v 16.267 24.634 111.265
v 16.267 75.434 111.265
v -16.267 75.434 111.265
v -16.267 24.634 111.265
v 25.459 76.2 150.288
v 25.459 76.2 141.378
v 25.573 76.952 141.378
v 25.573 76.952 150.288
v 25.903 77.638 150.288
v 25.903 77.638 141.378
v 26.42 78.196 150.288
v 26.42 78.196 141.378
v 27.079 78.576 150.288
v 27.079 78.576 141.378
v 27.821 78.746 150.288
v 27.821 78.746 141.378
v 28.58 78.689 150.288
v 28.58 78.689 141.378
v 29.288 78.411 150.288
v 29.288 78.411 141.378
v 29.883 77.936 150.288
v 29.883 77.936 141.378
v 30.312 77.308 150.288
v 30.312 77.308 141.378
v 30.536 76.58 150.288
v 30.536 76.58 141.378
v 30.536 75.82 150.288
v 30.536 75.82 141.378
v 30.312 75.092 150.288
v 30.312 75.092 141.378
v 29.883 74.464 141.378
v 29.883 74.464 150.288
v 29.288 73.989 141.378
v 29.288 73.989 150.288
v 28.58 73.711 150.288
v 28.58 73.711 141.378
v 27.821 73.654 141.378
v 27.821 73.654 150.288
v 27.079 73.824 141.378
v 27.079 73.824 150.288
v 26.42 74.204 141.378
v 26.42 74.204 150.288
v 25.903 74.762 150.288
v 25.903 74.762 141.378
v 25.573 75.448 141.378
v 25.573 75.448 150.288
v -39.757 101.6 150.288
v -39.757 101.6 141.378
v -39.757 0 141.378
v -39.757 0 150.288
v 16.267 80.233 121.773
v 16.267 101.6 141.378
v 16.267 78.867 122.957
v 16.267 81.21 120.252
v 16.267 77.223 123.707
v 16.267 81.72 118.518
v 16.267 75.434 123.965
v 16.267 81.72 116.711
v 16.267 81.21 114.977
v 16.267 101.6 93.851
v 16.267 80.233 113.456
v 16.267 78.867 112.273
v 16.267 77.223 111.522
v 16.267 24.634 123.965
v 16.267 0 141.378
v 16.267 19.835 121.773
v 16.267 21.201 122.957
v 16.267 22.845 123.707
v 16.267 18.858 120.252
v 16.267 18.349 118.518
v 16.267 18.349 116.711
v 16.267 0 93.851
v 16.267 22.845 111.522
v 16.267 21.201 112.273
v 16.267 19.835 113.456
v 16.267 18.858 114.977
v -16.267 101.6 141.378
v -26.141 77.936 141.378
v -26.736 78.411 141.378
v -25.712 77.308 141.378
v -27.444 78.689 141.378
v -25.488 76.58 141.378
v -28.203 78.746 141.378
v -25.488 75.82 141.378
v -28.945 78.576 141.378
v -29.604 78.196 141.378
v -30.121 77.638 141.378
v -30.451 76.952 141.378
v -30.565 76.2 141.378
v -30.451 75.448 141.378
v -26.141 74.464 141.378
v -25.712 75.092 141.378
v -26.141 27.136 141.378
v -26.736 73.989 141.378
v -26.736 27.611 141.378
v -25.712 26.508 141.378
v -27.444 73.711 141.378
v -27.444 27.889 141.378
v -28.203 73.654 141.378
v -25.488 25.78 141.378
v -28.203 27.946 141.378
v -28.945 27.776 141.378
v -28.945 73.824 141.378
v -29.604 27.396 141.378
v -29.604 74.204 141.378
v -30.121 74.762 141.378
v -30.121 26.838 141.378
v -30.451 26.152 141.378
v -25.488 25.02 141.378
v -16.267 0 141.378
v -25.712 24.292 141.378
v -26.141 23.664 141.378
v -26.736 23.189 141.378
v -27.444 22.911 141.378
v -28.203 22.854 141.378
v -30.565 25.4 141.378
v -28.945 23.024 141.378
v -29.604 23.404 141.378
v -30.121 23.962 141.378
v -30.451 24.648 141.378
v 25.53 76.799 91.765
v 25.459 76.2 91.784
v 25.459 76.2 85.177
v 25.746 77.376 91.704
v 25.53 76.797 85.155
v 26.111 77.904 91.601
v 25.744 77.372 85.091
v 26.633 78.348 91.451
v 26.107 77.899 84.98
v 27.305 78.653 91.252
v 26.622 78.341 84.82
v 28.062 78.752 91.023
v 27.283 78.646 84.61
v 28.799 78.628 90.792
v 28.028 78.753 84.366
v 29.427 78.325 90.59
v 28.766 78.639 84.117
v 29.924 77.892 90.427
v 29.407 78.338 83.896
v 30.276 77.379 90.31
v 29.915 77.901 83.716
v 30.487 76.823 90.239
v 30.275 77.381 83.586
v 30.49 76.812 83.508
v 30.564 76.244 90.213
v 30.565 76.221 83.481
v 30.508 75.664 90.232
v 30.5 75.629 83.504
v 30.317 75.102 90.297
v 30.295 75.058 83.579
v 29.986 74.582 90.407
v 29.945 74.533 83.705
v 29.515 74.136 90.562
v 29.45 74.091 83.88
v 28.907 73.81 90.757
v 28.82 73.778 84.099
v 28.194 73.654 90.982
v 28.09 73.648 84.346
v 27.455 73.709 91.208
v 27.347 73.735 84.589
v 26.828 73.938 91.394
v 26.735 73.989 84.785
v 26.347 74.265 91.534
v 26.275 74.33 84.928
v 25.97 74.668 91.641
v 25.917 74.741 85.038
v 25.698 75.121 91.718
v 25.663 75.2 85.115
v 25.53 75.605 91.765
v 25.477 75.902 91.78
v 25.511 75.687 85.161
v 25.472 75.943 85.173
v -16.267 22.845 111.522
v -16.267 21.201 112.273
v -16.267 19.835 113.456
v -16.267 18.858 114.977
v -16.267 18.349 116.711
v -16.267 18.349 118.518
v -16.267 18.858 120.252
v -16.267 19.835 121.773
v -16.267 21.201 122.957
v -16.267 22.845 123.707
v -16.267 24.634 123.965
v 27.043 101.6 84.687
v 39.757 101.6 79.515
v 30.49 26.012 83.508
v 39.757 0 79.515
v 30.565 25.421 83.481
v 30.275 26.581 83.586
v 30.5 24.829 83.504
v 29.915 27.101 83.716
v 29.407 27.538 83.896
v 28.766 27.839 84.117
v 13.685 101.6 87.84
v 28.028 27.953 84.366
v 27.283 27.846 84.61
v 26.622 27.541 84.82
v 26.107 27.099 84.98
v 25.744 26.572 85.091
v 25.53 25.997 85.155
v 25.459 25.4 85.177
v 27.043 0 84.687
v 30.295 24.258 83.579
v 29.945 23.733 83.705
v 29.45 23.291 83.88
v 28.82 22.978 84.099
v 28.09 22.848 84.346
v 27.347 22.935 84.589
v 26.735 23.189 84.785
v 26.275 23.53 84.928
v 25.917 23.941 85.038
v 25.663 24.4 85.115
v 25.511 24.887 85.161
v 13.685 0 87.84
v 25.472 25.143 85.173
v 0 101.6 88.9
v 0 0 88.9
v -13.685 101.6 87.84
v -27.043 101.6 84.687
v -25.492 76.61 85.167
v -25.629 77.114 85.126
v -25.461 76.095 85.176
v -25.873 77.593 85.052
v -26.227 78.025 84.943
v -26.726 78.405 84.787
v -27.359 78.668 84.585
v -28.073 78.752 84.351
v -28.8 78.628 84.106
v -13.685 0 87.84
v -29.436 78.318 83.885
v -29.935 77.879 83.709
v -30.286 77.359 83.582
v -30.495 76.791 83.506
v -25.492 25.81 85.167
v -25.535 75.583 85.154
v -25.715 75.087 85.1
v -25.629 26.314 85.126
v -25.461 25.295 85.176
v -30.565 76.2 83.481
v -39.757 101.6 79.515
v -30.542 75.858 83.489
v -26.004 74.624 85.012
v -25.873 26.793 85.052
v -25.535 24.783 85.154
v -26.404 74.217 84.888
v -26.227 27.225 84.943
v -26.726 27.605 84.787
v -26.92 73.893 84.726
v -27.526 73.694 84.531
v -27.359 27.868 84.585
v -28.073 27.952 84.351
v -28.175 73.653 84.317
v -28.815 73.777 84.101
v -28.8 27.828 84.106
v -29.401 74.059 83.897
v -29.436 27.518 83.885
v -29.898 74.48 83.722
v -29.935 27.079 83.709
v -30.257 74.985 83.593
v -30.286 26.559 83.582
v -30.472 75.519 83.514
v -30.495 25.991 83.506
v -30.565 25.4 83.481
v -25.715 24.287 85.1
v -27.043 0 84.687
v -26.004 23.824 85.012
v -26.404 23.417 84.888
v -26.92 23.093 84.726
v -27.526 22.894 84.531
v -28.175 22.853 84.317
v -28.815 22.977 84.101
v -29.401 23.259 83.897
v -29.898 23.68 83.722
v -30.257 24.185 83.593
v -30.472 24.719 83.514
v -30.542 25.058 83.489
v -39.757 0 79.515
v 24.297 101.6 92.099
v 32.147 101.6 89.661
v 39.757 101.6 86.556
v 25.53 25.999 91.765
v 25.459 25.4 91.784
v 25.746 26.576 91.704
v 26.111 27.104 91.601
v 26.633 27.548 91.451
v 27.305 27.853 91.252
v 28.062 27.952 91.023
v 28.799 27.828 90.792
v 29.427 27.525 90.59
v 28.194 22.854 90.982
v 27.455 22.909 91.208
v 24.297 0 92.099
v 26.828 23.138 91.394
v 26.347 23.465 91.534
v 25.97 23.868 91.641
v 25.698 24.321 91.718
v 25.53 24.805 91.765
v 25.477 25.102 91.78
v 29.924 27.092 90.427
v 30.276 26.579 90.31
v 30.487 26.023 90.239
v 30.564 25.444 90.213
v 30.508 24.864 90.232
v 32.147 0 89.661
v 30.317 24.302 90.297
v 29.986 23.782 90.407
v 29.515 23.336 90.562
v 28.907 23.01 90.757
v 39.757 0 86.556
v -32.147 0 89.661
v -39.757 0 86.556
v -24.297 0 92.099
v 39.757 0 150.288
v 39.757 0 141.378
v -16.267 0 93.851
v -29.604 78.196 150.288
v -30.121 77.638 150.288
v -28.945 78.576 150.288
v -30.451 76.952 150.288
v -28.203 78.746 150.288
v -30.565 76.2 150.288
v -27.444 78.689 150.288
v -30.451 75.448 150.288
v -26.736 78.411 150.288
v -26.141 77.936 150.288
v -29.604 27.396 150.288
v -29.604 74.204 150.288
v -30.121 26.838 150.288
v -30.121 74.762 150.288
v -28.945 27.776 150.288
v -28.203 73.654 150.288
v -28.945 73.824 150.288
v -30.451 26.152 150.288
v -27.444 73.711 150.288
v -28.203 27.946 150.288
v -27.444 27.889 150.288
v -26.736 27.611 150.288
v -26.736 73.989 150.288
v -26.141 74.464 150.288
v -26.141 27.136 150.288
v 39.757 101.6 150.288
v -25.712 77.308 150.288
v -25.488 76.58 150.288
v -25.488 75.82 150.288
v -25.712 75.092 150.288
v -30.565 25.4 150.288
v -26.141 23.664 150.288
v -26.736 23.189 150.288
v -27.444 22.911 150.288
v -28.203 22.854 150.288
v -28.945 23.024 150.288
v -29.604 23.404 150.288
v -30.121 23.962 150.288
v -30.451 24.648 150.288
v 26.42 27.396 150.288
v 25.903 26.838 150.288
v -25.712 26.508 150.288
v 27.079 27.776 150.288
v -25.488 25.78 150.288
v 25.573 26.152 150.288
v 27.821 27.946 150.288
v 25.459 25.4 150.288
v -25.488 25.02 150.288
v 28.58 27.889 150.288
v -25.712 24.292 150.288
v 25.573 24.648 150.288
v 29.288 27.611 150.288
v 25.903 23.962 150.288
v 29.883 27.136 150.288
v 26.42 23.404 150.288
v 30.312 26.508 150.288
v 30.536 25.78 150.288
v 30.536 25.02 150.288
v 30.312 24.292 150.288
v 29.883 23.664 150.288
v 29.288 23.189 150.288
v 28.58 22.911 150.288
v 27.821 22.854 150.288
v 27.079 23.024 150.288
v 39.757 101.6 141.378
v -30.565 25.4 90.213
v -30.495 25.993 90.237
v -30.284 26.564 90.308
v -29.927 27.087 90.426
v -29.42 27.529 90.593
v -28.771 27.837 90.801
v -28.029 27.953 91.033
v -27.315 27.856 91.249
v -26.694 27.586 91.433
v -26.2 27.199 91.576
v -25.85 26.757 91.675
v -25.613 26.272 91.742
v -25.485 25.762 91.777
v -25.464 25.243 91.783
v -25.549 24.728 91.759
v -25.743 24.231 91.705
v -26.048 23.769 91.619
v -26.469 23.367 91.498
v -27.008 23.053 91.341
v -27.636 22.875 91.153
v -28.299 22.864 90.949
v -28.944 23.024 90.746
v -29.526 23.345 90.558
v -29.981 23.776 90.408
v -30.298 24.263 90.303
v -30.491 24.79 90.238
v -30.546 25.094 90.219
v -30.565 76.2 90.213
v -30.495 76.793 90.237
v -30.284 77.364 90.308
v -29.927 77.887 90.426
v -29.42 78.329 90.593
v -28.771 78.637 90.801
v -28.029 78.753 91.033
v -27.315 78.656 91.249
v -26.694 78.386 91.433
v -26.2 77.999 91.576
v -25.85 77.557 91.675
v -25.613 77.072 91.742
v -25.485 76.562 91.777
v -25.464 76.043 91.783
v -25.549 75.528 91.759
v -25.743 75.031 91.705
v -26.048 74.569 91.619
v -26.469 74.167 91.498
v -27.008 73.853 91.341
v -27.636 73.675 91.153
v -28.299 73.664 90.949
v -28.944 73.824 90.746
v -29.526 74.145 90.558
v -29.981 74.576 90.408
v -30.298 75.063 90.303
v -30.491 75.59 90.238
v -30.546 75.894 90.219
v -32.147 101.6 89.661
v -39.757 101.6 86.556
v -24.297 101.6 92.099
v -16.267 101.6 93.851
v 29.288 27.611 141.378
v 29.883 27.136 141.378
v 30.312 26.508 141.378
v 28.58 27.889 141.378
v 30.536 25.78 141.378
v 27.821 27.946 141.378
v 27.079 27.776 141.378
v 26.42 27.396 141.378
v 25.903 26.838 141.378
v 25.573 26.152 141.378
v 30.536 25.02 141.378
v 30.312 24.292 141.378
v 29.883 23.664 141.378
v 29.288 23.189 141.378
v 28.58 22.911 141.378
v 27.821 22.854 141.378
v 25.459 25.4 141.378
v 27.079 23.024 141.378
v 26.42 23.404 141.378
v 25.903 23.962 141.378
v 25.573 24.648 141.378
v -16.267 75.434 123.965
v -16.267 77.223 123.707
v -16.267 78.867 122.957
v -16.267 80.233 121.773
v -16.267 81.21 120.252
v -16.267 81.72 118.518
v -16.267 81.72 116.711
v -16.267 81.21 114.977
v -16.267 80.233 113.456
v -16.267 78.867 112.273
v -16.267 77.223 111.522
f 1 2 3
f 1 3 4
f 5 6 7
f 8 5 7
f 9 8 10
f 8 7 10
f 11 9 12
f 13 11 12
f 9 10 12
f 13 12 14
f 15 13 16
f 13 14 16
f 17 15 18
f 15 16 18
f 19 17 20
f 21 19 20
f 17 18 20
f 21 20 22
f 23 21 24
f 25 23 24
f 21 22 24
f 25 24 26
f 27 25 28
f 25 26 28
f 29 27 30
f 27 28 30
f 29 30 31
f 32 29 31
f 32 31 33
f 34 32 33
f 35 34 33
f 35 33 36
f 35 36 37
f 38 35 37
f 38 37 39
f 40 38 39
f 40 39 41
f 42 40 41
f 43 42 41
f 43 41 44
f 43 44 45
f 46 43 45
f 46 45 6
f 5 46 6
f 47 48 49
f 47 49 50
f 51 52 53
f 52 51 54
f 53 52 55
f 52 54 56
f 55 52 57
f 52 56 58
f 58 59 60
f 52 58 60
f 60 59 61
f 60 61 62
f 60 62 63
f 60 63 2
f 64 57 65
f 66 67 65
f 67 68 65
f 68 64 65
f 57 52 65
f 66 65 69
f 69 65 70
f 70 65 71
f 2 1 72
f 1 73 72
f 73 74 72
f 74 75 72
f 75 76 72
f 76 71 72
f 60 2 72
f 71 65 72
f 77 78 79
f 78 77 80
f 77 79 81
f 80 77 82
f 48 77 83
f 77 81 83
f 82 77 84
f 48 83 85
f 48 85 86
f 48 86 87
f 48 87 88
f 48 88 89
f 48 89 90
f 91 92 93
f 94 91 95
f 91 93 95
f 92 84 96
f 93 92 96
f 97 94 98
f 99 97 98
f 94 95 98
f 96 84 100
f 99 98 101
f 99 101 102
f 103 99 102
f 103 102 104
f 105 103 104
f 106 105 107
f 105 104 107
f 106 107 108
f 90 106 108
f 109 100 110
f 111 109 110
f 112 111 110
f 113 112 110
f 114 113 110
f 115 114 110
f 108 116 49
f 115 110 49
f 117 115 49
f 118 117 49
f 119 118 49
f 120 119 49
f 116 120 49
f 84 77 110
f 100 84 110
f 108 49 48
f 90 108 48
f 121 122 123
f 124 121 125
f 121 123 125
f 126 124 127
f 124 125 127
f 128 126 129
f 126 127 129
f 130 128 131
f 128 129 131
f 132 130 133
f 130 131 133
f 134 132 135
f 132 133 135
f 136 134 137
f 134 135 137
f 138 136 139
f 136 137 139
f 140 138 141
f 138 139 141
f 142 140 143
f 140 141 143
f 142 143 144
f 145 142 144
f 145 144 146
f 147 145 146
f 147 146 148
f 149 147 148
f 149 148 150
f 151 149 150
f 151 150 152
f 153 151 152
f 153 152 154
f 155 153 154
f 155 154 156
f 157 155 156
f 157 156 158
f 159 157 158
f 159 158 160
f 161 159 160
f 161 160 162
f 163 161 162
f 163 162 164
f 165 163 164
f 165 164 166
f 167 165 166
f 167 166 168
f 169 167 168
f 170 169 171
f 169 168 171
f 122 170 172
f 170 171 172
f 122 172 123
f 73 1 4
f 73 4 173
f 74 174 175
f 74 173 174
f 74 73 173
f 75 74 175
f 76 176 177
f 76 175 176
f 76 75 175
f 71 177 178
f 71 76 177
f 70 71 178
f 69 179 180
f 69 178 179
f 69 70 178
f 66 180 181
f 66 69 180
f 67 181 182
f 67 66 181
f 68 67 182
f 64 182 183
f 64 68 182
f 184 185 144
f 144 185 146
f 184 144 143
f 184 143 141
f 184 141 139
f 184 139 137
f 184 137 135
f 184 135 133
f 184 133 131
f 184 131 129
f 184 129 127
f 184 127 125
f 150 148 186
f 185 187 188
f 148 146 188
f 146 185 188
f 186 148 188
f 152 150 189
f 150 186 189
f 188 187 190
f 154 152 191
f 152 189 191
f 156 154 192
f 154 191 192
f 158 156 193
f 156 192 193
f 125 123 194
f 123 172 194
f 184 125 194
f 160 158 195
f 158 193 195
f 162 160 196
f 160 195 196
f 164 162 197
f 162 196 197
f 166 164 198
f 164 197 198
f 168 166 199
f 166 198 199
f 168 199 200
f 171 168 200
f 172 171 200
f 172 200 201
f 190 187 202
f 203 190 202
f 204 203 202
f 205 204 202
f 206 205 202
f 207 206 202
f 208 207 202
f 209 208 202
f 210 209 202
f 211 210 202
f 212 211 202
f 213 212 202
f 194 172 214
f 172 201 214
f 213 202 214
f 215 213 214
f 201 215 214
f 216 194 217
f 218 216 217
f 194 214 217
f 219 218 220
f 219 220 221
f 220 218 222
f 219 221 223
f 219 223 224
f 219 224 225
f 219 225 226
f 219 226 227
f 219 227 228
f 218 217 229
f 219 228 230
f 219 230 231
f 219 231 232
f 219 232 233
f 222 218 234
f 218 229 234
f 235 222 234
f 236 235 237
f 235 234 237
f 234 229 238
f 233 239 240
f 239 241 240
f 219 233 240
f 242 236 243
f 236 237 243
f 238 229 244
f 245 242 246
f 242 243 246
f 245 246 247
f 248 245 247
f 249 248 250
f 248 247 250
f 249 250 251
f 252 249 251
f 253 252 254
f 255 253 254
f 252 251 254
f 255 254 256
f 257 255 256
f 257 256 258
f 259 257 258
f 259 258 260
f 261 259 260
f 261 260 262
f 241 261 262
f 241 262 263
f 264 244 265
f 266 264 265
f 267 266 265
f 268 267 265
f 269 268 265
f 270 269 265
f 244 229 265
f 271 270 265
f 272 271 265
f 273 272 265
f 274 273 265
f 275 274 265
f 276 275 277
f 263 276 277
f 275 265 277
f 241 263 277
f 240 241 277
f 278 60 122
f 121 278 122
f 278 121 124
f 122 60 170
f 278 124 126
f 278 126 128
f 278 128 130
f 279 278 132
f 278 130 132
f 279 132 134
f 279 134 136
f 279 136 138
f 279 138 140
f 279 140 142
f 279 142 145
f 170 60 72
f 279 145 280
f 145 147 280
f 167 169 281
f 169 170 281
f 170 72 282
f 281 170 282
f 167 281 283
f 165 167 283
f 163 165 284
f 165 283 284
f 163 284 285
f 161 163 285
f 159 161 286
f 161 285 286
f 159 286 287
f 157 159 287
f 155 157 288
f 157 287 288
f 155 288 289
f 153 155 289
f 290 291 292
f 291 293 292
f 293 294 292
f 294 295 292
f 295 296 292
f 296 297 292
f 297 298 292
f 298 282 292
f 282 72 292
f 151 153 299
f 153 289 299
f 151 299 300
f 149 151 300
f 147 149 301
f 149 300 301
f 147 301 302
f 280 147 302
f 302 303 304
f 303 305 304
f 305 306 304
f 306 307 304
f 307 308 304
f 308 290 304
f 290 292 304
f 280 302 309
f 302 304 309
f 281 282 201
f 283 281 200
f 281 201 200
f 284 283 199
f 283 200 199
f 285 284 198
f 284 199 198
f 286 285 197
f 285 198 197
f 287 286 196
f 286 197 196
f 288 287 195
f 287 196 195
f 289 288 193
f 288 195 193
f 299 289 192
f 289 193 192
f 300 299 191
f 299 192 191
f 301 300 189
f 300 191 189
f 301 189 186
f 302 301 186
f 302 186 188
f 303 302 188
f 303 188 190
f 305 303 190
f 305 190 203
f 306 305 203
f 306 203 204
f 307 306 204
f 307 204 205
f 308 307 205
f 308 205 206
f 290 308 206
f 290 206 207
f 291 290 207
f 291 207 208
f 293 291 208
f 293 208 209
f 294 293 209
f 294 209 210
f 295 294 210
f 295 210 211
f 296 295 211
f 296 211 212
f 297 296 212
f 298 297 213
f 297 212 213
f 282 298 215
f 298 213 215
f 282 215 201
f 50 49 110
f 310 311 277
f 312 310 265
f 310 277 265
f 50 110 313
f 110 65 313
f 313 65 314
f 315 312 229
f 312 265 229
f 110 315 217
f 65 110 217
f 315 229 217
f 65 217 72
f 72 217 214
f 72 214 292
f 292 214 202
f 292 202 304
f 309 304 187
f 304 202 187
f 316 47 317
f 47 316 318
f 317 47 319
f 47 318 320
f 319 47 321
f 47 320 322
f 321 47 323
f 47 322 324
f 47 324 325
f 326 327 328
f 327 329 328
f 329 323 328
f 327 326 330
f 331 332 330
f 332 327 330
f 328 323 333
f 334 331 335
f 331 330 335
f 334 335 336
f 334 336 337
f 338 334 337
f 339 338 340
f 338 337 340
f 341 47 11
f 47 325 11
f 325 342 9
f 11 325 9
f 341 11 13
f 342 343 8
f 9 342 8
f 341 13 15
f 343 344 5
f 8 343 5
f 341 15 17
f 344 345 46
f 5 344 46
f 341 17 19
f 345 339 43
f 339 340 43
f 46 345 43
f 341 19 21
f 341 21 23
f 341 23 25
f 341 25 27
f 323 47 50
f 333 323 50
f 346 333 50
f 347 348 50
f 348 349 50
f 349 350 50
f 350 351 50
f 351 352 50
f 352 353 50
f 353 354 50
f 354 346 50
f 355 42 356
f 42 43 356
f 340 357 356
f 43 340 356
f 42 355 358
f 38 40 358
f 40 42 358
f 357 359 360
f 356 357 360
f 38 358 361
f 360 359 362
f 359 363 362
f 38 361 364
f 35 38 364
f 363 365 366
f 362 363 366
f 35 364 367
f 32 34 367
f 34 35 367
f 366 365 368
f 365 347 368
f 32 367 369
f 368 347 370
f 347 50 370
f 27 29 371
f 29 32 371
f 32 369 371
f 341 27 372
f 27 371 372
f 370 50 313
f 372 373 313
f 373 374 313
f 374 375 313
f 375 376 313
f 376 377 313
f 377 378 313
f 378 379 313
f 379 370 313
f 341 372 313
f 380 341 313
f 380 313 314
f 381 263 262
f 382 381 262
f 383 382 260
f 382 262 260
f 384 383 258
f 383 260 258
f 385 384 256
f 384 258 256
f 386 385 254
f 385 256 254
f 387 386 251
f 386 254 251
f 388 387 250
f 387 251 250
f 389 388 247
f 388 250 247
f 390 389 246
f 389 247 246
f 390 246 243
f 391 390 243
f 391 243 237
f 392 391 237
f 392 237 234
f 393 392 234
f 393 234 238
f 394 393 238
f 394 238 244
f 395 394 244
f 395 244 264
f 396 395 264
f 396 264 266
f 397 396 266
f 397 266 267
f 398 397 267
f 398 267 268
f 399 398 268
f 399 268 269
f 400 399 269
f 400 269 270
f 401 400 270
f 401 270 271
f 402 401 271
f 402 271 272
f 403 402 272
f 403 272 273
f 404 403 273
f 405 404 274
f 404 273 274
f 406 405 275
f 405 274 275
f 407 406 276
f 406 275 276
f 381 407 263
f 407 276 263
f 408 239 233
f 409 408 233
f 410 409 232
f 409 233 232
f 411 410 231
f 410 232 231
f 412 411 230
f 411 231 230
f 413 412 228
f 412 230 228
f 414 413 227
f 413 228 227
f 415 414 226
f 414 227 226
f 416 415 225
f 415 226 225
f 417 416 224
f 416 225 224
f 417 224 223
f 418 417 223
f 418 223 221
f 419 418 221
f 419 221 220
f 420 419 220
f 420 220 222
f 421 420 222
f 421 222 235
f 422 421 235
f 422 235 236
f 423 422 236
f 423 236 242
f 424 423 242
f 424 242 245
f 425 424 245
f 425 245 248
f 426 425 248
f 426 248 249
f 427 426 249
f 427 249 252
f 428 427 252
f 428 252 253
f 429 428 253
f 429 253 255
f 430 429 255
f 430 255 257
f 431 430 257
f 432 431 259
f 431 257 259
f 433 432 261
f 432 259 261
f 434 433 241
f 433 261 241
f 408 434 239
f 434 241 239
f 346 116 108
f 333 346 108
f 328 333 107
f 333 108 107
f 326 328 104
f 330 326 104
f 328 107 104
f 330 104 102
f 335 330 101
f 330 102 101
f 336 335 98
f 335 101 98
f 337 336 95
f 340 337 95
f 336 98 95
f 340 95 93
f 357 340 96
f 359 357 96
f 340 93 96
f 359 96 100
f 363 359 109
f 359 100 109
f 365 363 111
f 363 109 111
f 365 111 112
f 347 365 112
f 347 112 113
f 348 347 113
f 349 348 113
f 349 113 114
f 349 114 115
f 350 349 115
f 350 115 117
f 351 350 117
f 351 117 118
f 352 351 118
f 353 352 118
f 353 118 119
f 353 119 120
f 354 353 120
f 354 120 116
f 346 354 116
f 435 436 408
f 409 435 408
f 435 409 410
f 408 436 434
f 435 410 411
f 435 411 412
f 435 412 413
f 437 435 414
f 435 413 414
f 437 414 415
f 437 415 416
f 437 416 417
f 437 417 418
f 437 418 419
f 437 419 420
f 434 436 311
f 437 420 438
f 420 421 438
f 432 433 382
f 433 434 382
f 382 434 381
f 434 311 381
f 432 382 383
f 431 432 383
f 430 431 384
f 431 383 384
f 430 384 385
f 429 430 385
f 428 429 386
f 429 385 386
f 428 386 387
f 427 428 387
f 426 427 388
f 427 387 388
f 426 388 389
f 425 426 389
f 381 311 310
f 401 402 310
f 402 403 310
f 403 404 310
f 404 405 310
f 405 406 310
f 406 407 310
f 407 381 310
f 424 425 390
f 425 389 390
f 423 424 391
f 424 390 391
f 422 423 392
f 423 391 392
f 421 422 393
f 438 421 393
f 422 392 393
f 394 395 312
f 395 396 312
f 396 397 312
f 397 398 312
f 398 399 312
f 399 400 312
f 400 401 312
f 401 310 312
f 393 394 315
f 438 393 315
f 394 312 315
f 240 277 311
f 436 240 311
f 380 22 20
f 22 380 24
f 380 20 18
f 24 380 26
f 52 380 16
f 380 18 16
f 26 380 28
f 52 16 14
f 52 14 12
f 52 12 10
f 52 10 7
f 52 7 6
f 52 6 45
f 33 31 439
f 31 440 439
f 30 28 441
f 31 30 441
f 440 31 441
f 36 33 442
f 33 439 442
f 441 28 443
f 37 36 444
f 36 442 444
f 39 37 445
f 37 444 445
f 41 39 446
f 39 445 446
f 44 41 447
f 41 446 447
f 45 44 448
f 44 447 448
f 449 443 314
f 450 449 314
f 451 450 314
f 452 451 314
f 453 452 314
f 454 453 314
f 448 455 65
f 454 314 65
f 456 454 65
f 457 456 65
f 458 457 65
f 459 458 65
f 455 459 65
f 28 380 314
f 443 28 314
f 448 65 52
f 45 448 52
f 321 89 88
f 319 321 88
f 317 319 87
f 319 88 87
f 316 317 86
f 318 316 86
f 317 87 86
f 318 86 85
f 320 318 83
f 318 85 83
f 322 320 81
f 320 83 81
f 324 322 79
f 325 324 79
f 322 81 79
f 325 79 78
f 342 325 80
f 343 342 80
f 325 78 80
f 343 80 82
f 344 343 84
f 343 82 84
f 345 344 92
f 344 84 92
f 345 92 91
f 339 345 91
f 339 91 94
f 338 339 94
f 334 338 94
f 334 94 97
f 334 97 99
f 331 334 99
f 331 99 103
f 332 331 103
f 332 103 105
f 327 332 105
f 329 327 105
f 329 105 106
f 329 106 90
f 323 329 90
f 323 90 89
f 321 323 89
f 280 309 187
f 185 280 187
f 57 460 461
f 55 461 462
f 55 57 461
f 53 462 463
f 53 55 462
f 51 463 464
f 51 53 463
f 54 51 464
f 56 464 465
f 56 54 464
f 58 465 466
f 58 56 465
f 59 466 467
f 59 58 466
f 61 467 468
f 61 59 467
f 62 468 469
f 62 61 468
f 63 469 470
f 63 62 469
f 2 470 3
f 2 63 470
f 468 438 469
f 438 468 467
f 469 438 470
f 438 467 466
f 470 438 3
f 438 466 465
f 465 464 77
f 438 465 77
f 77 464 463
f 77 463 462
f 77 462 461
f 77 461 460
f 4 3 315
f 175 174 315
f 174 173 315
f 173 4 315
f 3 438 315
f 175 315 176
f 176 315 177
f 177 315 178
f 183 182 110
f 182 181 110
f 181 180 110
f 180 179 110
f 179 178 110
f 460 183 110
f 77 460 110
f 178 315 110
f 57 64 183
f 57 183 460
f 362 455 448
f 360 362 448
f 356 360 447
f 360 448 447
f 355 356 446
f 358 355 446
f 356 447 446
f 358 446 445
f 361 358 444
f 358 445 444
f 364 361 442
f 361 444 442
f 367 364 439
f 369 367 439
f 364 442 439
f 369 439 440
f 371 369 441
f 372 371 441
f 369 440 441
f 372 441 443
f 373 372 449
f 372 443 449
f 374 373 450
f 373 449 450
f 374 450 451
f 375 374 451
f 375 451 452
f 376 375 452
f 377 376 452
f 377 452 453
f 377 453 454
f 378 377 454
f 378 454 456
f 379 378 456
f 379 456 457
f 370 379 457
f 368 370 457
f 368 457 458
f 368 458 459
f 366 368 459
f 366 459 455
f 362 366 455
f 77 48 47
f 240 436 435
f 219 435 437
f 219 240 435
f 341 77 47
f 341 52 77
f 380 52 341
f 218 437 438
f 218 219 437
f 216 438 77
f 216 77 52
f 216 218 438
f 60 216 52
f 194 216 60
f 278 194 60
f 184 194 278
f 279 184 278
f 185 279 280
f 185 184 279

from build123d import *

# Parameters (mm, degrees)
BOSS_EXTRUDE1_DEPTH         = 101.6
CUT_EXTRUDE1_DEPTH          = 57.023894283
TAP_DRILL_FOR_1_4_20_TAP2_D = 5.1054


with BuildPart() as part:
    # Sketch1 → Boss-Extrude1 (new body)
    with BuildSketch(Plane(origin=(0, 0, 0), x_dir=(1, 0, 0), z_dir=(0, 1, 0))):
        with BuildLine():
            Line((-16.266605643, -141.378421793), (-39.75728864, -141.378421793))
            Line((-39.75728864, -141.378421793), (-39.75728864, -150.287727069))
            Line((-39.75728864, -150.287727069), (39.75728864, -150.287727069))
            Line((39.75728864, -150.287727069), (39.75728864, -141.378421793))
            Line((39.75728864, -141.378421793), (16.266605643, -141.378421793))
            Line((16.266605643, -141.378421793), (16.266605643, -93.850732767))
            ThreePointArc((16.266605643, -93.850732767), (28.248414097, -90.964771208), (39.75728864, -86.555880794))
            Line((39.75728864, -86.555880794), (39.75728864, -79.51457728))
            ThreePointArc((39.75728864, -79.51457728), (0, -88.9), (-39.75728864, -79.51457728))
            Line((-39.75728864, -79.51457728), (-39.75728864, -86.555880794))
            ThreePointArc((-39.75728864, -86.555880794), (-28.248414097, -90.964771208), (-16.266605643, -93.850732767))
            Line((-16.266605643, -93.850732767), (-16.266605643, -141.378421793))
        make_face()
    extrude(amount=BOSS_EXTRUDE1_DEPTH)

    # Sketch2 → Cut-Extrude1 (cut, through all)
    with BuildSketch(Plane(origin=(16.266605643, 0, 0), x_dir=(0, 0, -1), z_dir=(1, 0, 0))):
        with BuildLine():
            Line((-111.26457728, 75.434320996), (-111.26457728, 24.634320996))
            ThreePointArc((-111.26457728, 24.634320996), (-117.61457728, 18.284320996), (-123.96457728, 24.634320996))
            Line((-123.96457728, 24.634320996), (-123.96457728, 75.434320996))
            ThreePointArc((-123.96457728, 75.434320996), (-117.61457728, 81.784320996), (-111.26457728, 75.434320996))
        make_face()
    extrude(amount=-CUT_EXTRUDE1_DEPTH, mode=Mode.SUBTRACT)

    # Tap Drill for 1/4-20 Tap2 (through all)
    with Locations(Plane.XY.offset(150.287727069)):
        with Locations((28.011947142, 76.2), (-28.011947142, 76.2), (-28.011947142, 25.4), (28.011947142, 25.4)):
            Hole(TAP_DRILL_FOR_1_4_20_TAP2_D / 2)


solid = part.part
